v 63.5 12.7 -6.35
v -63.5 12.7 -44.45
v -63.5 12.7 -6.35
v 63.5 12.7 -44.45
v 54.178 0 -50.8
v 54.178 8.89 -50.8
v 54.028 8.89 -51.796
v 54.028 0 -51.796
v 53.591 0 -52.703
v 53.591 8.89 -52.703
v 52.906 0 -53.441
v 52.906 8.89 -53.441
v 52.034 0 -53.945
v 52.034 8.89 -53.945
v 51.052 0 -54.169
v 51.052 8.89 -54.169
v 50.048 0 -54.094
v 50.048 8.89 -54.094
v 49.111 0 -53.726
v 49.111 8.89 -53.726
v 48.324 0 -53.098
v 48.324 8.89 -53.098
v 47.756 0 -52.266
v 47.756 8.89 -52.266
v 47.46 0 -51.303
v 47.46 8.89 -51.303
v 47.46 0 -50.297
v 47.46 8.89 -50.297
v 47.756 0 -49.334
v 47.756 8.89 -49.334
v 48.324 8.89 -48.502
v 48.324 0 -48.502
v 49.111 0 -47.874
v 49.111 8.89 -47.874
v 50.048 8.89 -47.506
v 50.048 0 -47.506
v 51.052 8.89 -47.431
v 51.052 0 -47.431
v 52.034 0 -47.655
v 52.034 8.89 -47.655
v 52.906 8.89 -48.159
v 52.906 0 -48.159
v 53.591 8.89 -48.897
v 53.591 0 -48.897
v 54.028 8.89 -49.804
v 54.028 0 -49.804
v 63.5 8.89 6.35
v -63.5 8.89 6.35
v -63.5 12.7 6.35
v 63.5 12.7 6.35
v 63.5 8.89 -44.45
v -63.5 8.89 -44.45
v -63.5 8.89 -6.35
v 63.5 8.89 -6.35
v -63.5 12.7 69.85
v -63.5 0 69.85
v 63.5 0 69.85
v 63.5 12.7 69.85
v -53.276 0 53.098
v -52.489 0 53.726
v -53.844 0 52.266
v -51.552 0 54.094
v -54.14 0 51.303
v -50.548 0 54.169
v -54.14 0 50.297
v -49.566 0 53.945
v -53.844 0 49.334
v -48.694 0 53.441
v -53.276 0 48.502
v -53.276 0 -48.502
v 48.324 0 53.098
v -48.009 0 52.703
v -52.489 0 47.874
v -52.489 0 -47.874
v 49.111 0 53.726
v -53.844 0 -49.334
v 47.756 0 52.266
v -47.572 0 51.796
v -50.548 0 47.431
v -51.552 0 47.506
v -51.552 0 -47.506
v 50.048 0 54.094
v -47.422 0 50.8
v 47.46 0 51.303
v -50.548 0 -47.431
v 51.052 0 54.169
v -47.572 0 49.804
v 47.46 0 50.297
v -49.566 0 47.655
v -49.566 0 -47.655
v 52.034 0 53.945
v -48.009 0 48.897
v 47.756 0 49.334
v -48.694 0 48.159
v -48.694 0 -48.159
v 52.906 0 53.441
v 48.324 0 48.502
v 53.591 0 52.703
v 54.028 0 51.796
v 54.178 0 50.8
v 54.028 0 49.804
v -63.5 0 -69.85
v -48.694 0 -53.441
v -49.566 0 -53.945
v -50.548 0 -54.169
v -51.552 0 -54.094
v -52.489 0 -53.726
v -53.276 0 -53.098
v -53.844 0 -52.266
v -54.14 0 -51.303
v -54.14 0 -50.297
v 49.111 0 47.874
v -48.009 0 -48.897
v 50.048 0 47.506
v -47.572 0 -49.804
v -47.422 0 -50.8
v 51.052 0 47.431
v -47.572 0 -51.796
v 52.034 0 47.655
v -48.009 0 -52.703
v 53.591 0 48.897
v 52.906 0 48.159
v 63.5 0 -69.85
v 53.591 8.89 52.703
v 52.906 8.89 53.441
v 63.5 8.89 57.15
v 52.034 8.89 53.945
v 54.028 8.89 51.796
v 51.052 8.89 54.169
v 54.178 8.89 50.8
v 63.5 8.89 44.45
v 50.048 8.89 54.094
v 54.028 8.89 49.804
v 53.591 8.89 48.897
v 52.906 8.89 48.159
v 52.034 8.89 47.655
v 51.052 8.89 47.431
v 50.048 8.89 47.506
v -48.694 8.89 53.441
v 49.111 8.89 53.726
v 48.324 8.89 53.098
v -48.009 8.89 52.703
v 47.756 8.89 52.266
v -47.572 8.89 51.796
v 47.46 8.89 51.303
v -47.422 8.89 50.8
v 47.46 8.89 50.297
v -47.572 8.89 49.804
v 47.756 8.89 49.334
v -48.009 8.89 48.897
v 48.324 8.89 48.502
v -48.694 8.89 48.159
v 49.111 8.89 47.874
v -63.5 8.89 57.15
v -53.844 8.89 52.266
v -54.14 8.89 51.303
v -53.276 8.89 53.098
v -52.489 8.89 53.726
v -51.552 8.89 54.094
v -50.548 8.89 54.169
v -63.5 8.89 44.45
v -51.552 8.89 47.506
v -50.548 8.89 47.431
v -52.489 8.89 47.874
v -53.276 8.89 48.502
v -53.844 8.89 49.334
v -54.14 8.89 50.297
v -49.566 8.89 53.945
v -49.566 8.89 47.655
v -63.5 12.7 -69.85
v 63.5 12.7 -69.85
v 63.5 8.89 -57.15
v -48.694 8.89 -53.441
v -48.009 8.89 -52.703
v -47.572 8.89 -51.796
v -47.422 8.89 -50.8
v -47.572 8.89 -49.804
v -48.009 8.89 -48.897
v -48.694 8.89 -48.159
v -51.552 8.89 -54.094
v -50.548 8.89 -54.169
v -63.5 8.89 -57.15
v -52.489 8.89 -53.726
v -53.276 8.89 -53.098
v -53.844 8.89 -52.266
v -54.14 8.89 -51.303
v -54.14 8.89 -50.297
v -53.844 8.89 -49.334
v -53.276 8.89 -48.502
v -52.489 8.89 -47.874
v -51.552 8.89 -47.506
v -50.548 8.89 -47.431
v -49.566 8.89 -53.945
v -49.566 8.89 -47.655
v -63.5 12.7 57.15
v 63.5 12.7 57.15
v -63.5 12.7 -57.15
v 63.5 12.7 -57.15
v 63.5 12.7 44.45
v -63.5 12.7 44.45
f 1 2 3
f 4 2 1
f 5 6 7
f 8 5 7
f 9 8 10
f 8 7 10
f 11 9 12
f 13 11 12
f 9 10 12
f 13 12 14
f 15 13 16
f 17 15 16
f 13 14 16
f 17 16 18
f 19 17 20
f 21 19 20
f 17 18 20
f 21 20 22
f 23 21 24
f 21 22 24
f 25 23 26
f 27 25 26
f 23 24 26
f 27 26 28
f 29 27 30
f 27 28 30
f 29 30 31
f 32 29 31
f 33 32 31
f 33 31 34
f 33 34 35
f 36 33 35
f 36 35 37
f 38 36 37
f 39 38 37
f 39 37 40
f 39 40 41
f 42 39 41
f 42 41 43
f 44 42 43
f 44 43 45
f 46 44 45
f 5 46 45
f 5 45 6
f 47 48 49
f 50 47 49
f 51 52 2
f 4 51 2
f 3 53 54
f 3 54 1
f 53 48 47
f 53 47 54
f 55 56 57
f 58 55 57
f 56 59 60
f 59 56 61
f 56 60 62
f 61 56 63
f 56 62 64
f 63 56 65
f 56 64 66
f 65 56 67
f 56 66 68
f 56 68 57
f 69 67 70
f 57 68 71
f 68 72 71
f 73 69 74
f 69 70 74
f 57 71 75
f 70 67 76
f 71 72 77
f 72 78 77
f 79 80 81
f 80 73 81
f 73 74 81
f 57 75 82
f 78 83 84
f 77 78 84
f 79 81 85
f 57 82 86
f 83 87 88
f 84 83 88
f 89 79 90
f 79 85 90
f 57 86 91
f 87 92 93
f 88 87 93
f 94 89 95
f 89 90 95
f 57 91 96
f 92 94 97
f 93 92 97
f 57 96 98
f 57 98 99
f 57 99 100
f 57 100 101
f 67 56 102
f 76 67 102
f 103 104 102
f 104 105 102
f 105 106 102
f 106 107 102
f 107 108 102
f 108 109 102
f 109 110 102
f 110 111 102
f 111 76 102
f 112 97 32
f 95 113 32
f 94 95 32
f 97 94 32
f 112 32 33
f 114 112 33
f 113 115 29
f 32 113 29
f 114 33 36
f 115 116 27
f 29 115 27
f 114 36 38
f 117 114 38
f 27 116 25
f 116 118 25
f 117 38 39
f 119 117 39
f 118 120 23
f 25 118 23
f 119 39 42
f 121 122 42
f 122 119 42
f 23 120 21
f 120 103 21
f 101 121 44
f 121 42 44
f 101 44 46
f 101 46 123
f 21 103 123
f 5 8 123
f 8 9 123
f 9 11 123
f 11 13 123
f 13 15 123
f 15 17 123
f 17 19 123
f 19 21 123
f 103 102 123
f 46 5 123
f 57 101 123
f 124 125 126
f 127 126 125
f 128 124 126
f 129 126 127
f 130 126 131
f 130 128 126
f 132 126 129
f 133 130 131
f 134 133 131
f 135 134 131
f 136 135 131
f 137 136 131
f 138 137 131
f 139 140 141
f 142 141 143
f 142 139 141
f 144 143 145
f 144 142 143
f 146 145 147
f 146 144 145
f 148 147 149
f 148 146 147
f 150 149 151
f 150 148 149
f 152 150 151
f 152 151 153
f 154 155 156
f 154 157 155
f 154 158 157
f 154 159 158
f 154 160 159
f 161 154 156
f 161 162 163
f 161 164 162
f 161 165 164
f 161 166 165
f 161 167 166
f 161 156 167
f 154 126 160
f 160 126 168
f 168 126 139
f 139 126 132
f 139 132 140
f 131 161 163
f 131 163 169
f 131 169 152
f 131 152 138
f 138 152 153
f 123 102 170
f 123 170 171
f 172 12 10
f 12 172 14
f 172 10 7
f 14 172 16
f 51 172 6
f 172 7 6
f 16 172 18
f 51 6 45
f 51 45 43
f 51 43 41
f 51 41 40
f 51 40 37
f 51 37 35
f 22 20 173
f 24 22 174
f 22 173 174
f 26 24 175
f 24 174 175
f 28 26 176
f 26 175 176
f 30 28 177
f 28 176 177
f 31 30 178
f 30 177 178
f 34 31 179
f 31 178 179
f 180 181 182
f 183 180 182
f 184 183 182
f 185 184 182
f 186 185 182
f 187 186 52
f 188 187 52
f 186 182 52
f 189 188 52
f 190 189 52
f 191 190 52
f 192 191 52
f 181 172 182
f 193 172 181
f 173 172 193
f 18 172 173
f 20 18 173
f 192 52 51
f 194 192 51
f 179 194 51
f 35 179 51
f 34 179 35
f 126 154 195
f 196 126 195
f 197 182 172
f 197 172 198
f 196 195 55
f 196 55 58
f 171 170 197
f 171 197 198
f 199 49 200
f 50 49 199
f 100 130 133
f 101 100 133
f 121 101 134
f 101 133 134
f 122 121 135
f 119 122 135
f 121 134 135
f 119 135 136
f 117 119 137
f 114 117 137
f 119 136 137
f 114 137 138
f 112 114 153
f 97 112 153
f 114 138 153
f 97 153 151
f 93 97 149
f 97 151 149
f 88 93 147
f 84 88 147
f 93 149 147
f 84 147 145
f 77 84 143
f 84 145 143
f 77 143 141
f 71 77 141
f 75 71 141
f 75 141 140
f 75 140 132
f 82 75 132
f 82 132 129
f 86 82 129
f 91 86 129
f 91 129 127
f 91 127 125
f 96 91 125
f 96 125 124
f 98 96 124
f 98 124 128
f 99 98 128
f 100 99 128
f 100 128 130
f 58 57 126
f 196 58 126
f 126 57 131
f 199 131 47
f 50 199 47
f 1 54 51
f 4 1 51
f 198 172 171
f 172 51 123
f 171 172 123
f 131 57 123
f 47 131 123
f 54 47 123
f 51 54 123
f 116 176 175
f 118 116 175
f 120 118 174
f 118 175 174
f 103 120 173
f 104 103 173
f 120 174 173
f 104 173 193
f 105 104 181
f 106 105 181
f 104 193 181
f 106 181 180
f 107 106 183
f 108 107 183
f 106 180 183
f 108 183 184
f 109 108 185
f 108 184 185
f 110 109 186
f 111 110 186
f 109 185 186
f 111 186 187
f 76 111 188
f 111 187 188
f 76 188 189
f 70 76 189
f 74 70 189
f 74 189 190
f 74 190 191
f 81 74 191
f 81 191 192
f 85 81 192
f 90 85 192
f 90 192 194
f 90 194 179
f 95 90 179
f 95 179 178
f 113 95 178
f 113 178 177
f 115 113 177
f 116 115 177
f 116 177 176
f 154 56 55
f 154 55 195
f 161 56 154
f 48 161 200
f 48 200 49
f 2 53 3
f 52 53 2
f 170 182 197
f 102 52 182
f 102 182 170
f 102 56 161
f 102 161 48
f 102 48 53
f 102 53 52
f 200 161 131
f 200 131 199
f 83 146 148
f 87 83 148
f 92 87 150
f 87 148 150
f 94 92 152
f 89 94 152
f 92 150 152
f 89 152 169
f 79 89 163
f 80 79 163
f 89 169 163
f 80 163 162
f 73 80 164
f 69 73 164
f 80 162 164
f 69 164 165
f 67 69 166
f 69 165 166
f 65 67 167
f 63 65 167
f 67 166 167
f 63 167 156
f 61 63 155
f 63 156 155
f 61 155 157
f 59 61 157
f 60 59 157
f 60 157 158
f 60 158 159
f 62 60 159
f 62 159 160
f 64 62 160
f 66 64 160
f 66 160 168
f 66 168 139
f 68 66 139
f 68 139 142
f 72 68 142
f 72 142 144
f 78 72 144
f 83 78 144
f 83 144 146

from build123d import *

# Parameters (mm, degrees)
SKETCH2_W               = 127
SKETCH2_H               = 139.7
BOSS_EXTRUDE1_DEPTH     = 12.7
SKETCH4_W               = 12.7
SKETCH4_H               = 3.81
CUT_EXTRUDE1_DEPTH      = 76.2
SKETCH5_W               = 12.7
SKETCH5_H               = 3.81
CUT_EXTRUDE2_DEPTH      = 76.2
MIRROR3_COPY_1_SKETCH_W = 12.7
MIRROR3_COPY_1_SKETCH_H = 3.81
MIRROR3_COPY_1_DEPTH    = 76.2
F_1_4_CLEARANCE_HOLE1_D = 6.7564


with BuildPart() as part:
    # Sketch2 → Boss-Extrude1 (new body)
    with BuildSketch(Plane(origin=(0, 0, 0), x_dir=(1, 0, 0), z_dir=(0, 1, 0))):
        Rectangle(SKETCH2_W, SKETCH2_H)
    extrude(amount=BOSS_EXTRUDE1_DEPTH)

    # Sketch4 → Cut-Extrude1 (cut)
    with BuildSketch(Plane(origin=(63.5, 0, 0), x_dir=(0, 0, -1), z_dir=(1, 0, 0))):
        with Locations((-50.8, 10.795)):
            Rectangle(SKETCH4_W, SKETCH4_H)
    cut_extrude1 = extrude(amount=-CUT_EXTRUDE1_DEPTH, mode=Mode.SUBTRACT)

    # Mirror1: Cut-Extrude1 across plane
    add(cut_extrude1.mirror(Plane.XY), mode=Mode.SUBTRACT)

    # Sketch5 → Cut-Extrude2 (cut)
    with BuildSketch(Plane(origin=(63.5, 0, 0), x_dir=(0, 0, -1), z_dir=(1, 0, 0))):
        with Locations((0, 10.795)):
            Rectangle(SKETCH5_W, SKETCH5_H)
    cut_extrude2 = extrude(amount=-CUT_EXTRUDE2_DEPTH, mode=Mode.SUBTRACT)

    # Mirror3: Cut-Extrude1, Cut-Extrude2 across plane
    add(cut_extrude1.mirror(Plane(origin=(0, 0, 0), x_dir=(0, 0, 1), z_dir=(1, 0, 0))), mode=Mode.SUBTRACT)
    add(cut_extrude2.mirror(Plane(origin=(0, 0, 0), x_dir=(0, 0, 1), z_dir=(1, 0, 0))), mode=Mode.SUBTRACT)

    # Mirror3 copy 1 sketch → Mirror3 copy 1 (cut)
    with BuildSketch(Plane.ZY.offset(63.5)):
        with Locations((-50.8, 10.795)):
            Rectangle(MIRROR3_COPY_1_SKETCH_W, MIRROR3_COPY_1_SKETCH_H)
    extrude(amount=-MIRROR3_COPY_1_DEPTH, mode=Mode.SUBTRACT)

    # 1/4 Clearance Hole1 (through all)
    with Locations(Plane(origin=(0, 0, 0), x_dir=(-1, 0, 0), z_dir=(0, -1, 0))):
        with Locations((-50.8, -50.8), (-50.8, 50.8), (50.8, 50.8), (50.8, -50.8)):
            Hole(F_1_4_CLEARANCE_HOLE1_D / 2)


solid = part.part
